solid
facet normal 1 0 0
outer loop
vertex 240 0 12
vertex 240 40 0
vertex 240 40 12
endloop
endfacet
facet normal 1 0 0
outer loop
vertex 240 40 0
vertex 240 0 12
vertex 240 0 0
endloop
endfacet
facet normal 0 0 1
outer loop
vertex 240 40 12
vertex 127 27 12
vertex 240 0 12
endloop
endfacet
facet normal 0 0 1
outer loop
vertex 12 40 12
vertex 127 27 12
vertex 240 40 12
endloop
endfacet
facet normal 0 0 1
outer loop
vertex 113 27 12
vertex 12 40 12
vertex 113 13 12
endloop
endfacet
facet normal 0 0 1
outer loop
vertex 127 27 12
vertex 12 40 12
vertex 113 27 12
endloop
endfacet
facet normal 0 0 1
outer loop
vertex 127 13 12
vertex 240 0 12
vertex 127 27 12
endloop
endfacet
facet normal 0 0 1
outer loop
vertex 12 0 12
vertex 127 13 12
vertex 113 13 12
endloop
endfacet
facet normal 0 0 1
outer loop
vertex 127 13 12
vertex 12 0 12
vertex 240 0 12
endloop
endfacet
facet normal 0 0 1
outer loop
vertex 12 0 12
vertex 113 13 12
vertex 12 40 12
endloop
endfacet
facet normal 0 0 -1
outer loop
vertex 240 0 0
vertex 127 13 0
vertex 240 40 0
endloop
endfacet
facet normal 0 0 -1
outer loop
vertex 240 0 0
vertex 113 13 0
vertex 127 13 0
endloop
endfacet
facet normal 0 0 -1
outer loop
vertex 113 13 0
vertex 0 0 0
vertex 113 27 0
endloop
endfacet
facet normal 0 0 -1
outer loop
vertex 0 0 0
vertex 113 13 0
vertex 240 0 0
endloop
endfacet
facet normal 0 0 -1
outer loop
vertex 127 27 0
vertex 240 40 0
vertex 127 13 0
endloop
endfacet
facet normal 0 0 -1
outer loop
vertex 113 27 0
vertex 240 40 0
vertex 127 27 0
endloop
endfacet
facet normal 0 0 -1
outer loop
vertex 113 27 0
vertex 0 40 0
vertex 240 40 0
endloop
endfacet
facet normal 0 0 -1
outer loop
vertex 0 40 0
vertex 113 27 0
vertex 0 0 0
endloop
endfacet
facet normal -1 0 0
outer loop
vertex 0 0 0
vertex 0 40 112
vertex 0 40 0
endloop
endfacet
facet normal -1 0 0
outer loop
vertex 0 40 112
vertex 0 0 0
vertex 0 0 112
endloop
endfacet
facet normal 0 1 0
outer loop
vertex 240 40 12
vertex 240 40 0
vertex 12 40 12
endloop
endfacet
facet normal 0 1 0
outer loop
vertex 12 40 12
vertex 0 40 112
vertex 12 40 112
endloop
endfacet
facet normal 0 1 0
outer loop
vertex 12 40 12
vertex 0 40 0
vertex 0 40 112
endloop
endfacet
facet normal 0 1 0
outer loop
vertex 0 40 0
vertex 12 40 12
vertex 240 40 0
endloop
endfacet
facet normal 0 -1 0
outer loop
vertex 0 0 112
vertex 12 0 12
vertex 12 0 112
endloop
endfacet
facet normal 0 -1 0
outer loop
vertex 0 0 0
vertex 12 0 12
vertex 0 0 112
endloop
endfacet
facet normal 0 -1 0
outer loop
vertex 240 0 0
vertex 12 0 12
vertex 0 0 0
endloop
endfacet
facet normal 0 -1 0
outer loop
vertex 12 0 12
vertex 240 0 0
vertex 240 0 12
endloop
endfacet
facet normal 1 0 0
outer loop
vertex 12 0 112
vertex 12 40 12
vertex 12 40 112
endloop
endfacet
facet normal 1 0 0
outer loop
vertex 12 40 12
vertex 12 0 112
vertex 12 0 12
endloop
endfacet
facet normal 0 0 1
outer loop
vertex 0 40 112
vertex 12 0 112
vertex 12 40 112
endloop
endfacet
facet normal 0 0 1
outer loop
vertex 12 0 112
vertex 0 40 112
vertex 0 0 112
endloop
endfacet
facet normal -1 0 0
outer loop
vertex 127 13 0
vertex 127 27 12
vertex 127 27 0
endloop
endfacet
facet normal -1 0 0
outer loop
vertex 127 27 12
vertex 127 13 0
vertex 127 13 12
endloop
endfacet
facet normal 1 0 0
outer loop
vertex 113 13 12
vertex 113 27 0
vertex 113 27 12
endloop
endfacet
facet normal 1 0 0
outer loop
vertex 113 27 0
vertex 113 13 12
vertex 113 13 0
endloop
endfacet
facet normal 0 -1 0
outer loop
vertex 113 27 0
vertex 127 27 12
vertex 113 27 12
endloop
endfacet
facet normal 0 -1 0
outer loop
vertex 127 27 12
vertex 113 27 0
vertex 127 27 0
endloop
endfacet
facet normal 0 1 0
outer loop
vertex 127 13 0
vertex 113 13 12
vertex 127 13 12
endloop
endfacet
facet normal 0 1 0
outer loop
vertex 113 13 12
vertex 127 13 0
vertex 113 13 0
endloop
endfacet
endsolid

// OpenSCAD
$fn = 32;

// ----------------------------------------------------------------------
// Gantry bracket: 200-250 mm L bracket
// ----------------------------------------------------------------------

// --- parameters (mm) ---
base_l = 240;             // base arm length, X
arm_w = 40;               // arm width, Y
thick = 12;               // arm thickness
up_h = 100;               // vertical arm height, Z
slot_w = 14;              // adjustment slot width in the base

total_h = up_h + thick;  // overall height

difference() {
  union() {
    cube([base_l, arm_w, thick]);
    cube([thick, arm_w, total_h]);
  }
  translate([base_l / 2 - slot_w / 2, arm_w / 2 - slot_w / 2, -1])
    cube([slot_w, slot_w, thick + 2]);
}
